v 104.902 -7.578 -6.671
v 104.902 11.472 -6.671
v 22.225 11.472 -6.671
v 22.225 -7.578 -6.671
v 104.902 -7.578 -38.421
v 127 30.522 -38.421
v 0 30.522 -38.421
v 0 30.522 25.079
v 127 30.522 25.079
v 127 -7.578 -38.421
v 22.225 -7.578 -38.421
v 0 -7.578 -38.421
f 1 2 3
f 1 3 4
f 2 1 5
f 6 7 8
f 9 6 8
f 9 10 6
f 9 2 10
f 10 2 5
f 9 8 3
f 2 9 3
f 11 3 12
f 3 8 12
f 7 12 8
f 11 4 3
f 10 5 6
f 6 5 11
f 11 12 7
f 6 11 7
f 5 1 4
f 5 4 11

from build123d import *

# Parameters (mm, degrees)
F1_DEPTH = 127
F2_START = 22.225
F2_DEPTH = 82.677


with BuildPart() as f1:
    # F0 (on Right) → F1 (new body)
    with BuildSketch(Plane.YZ):
        Polygon((30.5216386862, -38.4214240238), (30.5216386862, 25.0785759762), (11.4716386862, -6.6714240238), (-7.5783613138, -38.4214240238), align=None)
    extrude(amount=F1_DEPTH)

    # F0 (on Right) → F2 (join)
    with BuildSketch(Plane.YZ.offset(F2_START)):
        Polygon((-7.5783613138, -38.4214240238), (11.4716386862, -6.6714240238), (-7.5783613138, -6.6714240238), align=None)
    extrude(amount=F2_DEPTH)


solid = f1.part
